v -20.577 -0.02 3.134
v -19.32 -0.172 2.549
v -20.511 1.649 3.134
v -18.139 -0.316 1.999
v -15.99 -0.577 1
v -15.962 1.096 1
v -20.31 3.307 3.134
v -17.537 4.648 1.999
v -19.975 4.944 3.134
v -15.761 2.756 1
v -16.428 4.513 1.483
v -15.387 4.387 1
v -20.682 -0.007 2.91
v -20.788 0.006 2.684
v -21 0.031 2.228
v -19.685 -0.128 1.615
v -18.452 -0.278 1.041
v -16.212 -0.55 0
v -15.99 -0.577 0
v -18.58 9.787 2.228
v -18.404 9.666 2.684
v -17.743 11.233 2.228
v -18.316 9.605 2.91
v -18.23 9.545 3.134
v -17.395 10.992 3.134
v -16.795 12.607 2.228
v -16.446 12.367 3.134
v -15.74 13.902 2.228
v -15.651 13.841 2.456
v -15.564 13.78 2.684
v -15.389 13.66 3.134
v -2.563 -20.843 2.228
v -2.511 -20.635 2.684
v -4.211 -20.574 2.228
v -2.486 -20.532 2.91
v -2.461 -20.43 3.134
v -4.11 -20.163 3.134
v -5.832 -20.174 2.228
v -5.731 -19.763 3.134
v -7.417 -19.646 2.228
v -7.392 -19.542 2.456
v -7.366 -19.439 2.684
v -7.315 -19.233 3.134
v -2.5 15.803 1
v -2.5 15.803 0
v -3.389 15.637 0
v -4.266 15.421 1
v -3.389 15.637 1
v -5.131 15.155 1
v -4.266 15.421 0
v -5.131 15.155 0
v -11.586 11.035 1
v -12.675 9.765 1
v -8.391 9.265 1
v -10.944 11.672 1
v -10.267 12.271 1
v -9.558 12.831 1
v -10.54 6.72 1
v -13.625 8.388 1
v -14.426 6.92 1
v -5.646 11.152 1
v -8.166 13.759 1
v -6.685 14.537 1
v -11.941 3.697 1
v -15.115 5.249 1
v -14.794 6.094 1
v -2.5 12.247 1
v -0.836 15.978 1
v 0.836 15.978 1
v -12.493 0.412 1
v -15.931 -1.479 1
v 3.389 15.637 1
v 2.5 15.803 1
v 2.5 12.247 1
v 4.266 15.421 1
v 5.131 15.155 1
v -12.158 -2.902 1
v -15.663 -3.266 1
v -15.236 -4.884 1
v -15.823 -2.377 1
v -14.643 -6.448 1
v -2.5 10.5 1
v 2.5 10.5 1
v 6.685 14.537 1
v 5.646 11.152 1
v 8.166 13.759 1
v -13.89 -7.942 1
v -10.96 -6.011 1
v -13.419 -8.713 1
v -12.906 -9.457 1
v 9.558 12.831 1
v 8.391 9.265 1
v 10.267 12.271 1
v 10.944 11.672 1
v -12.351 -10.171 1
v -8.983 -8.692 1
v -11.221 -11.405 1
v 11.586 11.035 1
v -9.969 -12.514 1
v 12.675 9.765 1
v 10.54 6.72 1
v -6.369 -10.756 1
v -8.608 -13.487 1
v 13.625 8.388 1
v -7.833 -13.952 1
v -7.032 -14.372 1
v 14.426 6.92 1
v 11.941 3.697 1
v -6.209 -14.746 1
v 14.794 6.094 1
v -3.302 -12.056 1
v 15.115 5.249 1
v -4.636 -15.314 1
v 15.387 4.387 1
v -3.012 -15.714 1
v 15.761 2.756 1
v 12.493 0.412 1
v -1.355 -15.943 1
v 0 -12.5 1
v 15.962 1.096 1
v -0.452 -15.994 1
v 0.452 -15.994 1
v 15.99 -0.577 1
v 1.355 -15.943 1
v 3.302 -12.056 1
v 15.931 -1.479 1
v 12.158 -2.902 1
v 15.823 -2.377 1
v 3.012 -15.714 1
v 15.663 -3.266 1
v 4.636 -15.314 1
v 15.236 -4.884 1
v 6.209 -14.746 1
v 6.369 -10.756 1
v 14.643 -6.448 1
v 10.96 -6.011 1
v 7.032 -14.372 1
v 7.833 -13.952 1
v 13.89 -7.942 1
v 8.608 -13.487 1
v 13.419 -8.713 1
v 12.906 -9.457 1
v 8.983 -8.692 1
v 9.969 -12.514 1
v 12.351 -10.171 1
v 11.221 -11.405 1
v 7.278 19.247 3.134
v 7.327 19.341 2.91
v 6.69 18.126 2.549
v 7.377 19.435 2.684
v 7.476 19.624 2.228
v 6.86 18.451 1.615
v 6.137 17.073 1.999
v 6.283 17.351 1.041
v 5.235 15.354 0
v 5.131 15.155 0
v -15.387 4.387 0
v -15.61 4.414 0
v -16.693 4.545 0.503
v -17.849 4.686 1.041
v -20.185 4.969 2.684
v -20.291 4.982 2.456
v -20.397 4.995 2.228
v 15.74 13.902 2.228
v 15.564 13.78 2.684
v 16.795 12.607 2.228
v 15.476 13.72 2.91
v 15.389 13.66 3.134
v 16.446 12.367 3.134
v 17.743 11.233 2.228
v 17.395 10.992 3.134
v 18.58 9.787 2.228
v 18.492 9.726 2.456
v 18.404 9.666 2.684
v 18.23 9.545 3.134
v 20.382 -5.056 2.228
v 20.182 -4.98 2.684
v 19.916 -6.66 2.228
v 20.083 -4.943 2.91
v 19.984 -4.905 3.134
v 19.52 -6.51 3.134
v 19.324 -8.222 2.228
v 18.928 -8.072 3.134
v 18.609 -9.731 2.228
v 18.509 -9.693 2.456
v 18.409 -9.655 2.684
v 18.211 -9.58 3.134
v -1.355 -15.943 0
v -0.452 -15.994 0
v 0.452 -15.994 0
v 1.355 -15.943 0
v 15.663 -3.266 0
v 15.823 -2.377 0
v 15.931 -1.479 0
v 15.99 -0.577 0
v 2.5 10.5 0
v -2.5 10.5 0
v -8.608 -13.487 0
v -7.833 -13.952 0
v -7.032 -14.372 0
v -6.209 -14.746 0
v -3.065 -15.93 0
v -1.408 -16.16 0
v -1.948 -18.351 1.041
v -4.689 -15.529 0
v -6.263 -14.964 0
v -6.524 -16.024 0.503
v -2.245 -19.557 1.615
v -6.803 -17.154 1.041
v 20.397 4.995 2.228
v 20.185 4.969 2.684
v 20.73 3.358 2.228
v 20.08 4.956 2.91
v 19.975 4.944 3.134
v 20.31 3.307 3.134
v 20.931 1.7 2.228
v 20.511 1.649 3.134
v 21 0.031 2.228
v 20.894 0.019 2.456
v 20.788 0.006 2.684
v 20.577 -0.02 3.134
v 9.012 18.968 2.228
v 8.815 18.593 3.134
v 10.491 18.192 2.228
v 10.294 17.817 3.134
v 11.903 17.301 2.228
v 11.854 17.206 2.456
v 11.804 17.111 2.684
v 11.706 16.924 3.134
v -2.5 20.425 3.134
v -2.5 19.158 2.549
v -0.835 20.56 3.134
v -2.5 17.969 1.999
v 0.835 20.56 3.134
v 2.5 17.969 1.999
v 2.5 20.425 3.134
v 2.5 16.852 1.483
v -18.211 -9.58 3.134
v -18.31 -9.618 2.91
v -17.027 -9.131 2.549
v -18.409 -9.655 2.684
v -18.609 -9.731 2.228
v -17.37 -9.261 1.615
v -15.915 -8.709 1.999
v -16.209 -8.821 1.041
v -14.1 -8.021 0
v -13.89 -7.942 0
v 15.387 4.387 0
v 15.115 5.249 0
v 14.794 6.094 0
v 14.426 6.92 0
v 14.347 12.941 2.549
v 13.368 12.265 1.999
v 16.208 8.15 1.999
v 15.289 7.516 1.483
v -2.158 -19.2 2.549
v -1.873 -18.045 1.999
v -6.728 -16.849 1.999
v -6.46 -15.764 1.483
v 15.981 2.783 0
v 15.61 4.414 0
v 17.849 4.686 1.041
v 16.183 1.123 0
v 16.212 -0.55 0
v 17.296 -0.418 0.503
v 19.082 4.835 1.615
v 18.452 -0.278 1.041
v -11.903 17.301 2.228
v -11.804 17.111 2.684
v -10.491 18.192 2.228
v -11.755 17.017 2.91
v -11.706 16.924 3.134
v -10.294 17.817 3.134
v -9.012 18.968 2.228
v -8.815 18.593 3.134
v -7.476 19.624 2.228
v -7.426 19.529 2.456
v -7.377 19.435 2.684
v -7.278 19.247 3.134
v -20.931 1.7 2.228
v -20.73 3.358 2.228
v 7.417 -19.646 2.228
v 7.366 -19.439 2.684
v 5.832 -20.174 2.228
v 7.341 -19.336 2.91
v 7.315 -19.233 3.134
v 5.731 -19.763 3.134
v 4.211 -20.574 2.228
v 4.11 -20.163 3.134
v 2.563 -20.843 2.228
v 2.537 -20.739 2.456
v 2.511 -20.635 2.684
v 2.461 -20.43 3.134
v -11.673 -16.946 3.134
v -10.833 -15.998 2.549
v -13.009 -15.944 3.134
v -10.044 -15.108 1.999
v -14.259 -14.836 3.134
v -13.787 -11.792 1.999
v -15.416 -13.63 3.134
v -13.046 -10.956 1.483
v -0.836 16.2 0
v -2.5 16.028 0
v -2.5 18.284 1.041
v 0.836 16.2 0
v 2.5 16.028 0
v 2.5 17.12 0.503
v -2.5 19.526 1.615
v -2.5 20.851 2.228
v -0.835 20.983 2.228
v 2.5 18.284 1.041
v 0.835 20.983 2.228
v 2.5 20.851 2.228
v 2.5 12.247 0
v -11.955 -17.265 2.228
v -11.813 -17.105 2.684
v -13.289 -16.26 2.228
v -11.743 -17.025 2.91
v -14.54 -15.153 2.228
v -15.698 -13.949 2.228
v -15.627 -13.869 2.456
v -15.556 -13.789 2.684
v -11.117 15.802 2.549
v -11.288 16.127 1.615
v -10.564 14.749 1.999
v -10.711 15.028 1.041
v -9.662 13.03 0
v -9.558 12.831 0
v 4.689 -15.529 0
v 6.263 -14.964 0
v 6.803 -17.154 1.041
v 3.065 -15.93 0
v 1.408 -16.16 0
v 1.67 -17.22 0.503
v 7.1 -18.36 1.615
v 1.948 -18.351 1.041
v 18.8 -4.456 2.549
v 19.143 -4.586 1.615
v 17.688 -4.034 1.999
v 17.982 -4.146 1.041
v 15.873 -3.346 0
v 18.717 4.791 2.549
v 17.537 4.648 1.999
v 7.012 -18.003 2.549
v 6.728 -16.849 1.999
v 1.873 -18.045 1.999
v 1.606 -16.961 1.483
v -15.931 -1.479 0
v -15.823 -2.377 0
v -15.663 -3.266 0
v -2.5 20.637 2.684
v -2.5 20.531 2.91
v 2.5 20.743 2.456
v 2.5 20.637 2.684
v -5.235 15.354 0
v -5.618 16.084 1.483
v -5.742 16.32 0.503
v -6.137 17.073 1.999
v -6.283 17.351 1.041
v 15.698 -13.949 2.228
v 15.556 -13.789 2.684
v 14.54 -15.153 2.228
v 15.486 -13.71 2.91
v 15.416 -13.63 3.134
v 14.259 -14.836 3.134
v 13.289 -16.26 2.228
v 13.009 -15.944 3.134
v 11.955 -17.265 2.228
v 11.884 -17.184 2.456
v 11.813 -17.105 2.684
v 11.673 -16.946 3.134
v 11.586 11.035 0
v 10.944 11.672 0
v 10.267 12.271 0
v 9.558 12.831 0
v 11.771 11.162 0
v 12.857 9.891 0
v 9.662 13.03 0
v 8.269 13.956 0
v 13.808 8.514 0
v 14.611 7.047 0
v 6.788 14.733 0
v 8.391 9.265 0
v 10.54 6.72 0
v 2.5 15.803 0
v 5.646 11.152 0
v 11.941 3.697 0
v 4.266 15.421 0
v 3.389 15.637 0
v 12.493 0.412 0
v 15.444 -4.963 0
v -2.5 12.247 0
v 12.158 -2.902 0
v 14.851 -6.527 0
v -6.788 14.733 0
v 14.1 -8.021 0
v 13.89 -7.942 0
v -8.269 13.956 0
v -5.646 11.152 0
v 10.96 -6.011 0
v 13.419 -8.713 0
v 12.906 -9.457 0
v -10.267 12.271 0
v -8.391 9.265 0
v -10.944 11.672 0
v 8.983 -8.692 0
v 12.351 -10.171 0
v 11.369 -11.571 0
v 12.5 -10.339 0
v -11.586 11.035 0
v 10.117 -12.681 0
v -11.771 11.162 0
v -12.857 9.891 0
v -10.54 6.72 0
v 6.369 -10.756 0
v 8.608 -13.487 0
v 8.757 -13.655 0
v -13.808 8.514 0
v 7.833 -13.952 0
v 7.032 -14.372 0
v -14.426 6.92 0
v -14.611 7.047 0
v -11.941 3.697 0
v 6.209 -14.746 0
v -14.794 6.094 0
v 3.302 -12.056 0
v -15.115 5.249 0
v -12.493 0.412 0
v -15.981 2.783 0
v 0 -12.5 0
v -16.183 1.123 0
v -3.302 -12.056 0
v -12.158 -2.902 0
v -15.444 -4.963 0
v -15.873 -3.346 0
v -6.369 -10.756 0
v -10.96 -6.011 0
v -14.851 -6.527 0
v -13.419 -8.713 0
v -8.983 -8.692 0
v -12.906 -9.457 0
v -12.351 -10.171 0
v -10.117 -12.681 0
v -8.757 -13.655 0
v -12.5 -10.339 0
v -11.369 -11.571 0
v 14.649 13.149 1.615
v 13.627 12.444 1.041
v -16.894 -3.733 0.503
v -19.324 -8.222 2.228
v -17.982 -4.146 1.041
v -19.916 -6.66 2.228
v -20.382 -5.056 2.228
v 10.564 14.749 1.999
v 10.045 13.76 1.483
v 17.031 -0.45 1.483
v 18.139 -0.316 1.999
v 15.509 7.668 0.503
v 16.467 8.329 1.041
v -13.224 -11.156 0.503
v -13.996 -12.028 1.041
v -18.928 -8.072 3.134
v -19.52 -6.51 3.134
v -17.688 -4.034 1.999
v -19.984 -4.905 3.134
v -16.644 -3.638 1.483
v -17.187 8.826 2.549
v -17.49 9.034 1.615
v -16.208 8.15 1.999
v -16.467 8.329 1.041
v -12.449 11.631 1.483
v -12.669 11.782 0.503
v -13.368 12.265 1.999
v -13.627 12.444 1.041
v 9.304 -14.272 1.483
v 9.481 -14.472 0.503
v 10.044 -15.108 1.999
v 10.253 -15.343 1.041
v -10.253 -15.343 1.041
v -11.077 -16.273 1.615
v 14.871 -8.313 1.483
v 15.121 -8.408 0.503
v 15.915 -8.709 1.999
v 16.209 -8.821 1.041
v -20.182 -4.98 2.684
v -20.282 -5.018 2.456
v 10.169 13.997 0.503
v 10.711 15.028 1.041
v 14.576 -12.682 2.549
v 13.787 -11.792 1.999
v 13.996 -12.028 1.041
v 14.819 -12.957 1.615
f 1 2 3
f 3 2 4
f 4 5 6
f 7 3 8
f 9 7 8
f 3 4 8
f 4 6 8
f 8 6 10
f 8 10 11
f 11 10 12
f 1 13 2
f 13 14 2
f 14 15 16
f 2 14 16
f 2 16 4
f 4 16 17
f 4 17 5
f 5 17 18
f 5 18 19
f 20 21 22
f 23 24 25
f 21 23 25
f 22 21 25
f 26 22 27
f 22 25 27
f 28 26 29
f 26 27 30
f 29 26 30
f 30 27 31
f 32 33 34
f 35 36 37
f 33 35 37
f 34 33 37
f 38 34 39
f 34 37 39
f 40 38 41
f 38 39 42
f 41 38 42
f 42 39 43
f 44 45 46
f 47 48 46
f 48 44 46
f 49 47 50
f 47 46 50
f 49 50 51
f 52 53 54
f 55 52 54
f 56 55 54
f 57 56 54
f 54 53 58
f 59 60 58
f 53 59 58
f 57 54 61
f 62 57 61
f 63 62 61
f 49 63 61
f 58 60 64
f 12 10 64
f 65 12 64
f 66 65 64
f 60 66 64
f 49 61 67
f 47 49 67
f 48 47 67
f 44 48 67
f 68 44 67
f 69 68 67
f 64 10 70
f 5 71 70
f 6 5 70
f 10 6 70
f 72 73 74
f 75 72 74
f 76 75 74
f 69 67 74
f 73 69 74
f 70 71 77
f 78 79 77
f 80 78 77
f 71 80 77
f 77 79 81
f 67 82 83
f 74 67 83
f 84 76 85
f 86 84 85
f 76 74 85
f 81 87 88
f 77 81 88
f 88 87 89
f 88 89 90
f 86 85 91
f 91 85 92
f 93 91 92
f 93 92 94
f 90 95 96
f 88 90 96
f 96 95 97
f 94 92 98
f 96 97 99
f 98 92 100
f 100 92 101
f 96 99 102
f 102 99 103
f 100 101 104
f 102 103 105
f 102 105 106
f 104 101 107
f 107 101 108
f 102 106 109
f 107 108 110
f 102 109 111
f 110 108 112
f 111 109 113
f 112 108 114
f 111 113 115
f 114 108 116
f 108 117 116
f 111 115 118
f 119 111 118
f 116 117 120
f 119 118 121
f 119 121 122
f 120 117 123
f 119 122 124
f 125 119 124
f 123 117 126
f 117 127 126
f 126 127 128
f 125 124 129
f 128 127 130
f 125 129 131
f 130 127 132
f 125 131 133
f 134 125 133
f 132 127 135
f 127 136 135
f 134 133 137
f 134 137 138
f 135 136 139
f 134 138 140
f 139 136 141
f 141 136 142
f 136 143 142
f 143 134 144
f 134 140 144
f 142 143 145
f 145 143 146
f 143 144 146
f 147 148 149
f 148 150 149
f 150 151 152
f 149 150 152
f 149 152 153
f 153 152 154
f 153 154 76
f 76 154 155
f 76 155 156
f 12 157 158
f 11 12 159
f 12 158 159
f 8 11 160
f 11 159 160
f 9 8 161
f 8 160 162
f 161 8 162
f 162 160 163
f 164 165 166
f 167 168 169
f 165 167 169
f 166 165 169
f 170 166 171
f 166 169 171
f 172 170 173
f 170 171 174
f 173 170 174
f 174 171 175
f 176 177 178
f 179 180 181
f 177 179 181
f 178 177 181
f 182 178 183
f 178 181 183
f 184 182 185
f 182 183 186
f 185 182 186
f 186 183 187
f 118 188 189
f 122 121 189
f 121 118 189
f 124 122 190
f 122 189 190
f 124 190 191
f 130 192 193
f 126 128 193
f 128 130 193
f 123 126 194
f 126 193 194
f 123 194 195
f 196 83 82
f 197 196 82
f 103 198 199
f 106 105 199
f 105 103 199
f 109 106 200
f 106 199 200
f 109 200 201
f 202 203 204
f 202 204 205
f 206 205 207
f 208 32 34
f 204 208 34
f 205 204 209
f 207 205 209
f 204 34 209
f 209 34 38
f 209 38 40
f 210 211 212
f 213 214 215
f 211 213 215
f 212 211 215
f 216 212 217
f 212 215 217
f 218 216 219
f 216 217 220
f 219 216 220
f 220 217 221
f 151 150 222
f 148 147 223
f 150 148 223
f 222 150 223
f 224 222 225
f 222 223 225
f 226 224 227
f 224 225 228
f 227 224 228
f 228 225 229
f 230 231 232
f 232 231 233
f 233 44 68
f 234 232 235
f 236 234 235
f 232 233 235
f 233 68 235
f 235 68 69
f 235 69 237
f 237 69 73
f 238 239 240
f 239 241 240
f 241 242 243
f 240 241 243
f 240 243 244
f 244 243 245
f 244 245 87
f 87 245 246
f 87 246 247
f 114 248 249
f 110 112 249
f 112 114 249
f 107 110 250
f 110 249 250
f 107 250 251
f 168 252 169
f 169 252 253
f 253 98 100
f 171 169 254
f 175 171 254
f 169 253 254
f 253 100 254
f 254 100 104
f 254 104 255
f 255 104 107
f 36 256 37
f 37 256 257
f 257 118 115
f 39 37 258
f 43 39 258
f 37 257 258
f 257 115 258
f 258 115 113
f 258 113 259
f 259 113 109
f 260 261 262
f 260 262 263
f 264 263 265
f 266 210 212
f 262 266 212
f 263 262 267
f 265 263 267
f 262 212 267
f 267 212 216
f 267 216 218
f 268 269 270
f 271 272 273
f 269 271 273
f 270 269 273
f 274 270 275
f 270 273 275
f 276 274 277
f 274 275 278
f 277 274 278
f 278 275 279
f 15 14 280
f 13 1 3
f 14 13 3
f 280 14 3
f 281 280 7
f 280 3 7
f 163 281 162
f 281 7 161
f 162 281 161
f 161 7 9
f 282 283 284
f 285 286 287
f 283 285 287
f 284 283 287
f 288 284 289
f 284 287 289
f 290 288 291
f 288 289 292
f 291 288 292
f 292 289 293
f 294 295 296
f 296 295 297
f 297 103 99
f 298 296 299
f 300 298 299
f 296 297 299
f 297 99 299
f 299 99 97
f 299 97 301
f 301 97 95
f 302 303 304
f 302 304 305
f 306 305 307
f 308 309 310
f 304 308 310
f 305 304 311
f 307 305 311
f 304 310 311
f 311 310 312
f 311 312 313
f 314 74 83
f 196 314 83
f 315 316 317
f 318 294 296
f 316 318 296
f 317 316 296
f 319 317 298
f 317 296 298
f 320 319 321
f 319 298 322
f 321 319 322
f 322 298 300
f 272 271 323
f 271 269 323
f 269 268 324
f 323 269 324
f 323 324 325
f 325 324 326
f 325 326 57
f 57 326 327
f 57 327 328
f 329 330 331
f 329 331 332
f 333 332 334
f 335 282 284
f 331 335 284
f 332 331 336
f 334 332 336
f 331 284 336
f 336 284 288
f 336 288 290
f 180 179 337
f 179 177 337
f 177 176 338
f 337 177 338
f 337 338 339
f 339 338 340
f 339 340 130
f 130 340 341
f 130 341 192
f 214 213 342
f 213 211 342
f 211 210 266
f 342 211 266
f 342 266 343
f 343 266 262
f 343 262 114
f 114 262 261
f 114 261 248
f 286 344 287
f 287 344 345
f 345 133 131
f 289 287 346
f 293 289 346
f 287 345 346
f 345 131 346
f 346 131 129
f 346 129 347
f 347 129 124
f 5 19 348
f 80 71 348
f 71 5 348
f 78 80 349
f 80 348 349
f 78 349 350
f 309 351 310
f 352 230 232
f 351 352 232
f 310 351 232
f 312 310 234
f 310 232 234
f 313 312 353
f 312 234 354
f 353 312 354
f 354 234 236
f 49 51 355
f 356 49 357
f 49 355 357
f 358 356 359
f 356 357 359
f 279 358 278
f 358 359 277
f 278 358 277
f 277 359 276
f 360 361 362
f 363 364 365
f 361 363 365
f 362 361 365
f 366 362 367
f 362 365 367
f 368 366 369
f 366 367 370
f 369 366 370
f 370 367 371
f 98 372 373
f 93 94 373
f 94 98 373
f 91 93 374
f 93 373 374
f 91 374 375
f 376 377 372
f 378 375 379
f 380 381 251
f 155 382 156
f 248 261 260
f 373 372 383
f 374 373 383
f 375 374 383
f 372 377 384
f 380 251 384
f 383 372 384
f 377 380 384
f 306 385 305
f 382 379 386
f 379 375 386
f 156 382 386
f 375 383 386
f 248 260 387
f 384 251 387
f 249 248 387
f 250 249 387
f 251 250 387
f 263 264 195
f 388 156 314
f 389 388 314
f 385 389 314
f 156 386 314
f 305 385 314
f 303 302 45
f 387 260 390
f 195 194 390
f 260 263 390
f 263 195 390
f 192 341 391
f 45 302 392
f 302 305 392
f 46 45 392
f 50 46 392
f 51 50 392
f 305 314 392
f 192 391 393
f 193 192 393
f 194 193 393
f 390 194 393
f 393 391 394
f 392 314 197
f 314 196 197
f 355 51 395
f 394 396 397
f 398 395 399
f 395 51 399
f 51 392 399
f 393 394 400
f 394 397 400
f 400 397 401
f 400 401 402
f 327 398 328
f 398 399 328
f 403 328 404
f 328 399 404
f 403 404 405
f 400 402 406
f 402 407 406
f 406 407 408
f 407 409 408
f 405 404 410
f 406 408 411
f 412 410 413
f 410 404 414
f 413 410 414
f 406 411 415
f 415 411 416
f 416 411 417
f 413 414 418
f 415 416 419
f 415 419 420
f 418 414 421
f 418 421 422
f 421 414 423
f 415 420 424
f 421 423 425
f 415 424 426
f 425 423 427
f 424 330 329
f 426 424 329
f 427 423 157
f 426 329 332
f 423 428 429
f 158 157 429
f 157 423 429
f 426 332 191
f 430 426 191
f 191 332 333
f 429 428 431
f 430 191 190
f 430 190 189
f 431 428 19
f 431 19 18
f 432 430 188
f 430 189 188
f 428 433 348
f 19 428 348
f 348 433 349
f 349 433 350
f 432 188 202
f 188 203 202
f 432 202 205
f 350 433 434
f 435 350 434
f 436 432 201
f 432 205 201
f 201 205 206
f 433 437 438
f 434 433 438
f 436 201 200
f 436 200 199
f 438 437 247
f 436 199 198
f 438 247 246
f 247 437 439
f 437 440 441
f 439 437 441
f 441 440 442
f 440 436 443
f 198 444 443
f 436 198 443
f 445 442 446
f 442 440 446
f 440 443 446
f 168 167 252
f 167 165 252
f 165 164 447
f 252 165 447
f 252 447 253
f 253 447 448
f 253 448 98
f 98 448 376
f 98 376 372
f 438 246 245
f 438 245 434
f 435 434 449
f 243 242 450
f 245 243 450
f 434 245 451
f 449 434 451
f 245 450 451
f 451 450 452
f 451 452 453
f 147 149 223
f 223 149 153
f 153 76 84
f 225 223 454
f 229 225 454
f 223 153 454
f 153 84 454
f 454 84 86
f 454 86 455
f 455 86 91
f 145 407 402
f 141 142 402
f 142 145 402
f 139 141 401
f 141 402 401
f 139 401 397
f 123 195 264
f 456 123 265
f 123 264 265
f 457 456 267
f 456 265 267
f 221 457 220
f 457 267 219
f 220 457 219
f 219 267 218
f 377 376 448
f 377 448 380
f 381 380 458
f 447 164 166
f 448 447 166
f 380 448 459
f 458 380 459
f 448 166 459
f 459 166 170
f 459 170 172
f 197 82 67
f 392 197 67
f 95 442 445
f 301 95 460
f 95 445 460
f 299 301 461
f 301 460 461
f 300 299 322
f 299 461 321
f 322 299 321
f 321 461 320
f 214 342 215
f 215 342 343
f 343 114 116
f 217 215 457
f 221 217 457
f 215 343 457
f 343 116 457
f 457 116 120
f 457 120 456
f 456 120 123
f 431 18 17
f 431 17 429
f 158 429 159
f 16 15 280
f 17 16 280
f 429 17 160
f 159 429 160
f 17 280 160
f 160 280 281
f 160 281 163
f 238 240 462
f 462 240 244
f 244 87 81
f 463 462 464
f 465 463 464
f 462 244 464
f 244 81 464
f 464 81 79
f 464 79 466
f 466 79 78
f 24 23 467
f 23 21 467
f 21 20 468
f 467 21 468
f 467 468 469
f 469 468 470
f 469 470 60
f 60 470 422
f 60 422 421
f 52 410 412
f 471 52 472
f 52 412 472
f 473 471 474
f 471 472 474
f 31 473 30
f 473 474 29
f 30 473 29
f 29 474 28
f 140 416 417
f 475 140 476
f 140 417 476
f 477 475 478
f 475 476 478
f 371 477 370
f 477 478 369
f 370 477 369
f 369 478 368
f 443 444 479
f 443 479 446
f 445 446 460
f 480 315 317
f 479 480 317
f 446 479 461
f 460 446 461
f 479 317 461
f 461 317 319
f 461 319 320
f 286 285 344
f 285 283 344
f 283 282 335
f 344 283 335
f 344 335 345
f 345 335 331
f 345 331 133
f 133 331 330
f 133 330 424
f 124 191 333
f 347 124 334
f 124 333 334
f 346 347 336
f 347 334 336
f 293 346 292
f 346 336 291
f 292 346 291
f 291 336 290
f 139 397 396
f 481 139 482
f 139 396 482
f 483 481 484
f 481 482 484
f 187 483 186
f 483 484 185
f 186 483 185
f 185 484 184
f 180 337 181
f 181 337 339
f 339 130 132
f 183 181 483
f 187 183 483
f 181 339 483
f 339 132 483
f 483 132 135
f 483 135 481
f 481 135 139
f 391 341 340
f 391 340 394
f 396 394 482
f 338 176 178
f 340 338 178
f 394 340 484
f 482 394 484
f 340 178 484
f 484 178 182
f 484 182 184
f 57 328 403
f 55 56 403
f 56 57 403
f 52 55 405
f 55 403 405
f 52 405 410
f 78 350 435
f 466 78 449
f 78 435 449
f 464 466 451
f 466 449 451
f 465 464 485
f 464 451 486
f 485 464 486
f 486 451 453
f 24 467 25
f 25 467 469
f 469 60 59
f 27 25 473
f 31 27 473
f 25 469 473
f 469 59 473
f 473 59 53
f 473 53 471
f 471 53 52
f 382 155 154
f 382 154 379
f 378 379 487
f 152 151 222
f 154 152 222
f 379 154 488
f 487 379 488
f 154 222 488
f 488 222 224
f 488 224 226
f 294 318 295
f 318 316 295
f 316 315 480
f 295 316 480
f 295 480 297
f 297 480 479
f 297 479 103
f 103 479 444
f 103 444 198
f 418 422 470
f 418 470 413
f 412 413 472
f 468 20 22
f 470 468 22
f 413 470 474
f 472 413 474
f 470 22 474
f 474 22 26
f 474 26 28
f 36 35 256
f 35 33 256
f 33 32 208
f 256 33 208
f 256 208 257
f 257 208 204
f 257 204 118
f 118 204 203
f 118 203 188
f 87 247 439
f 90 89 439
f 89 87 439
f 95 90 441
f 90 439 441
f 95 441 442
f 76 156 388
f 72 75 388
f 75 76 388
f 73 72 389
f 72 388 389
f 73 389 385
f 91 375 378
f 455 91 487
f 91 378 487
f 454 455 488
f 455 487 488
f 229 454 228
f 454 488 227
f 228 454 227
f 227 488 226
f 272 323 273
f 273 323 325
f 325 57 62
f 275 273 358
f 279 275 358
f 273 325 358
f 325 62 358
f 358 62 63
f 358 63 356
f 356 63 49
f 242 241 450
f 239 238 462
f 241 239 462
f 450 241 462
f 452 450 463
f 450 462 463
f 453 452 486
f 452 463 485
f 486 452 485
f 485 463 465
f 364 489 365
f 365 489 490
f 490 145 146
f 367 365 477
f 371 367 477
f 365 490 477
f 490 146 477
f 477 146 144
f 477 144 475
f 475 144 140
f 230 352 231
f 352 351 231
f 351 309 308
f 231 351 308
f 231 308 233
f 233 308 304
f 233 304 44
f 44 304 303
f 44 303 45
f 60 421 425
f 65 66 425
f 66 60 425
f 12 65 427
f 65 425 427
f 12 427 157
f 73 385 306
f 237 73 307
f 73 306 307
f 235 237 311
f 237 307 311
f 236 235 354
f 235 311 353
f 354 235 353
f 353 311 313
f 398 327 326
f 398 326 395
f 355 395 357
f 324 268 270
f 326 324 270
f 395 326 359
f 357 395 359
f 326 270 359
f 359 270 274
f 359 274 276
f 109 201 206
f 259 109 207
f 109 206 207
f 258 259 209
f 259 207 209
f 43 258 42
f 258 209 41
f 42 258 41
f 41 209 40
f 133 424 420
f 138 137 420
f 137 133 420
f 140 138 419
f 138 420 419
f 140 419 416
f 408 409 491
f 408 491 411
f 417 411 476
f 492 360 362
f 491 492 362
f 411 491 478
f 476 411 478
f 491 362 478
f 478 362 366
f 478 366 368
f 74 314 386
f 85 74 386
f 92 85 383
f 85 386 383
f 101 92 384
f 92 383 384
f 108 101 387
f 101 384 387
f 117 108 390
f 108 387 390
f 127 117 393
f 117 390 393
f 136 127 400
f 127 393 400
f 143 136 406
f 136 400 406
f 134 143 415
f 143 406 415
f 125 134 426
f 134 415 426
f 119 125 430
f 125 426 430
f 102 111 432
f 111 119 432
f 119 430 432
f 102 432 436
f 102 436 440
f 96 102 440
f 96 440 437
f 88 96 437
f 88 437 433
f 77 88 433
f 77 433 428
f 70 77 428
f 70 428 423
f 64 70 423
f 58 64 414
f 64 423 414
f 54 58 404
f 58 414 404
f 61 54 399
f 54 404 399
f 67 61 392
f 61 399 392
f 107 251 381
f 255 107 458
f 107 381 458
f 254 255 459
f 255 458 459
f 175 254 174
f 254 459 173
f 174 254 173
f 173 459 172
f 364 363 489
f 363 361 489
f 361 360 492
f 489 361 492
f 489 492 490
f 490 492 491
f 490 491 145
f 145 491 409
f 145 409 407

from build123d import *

# Parameters (mm, degrees)
CUT_EXTRUDE2_DEPTH  = 30.863437355
CIRPATTERN1_COUNT   = 13
BOSS_EXTRUDE1_START = -1
BOSS_EXTRUDE1_DEPTH = 1


with BuildPart() as part:
    # Sketch1 → Base-Revolve (revolve)
    with BuildSketch(Plane(origin=(0, 0, 0), x_dir=(0, 0, -1), z_dir=(1, 0, 0)), mode=Mode.PRIVATE) as base_revolve_sk:
        Polygon((0, 12.5), (0, 16.221694663), (-2.228160372, 21), (-3.134468159, 20.577381738), (-1, 16), (-1, 12.5), align=None)
    revolve(base_revolve_sk.sketch.rotate(Axis((0, 0, 14), (0, 0, -1)), 90), axis=Axis((0, 0, 14), (0, 0, -1)))

    # Sketch3 → Cut-Extrude2 (cut, through all)
    with BuildSketch(Plane(origin=(0, 0, 0), x_dir=(-1, 0, 0), z_dir=(0, 0, -1))):
        with BuildLine():
            Line((-2.5, 15.803480629), (-2.5, 20.850659462))
            ThreePointArc((-2.5, 20.850659462), (-5.02562895, 20.389778166), (-7.47614454, 19.62414999))
            Line((-7.47614454, 19.62414999), (-5.130603583, 15.15509508))
            ThreePointArc((-5.130603583, 15.15509508), (-3.829050629, 15.535069079), (-2.5, 15.803480629))
        make_face()
    cut_extrude2 = extrude(amount=-CUT_EXTRUDE2_DEPTH, mode=Mode.SUBTRACT)

    # CirPattern1: Cut-Extrude2 ×13 about axis
    cirpattern1_axis = Axis((0, 0, 0), (0, 0, 1))
    for i in range(1, CIRPATTERN1_COUNT):
        add(cut_extrude2.rotate(cirpattern1_axis, i * 360 / CIRPATTERN1_COUNT), mode=Mode.SUBTRACT)

    # Sketch4 → Boss-Extrude1 (add)
    with BuildSketch(Plane(origin=(0, 0, 0), x_dir=(-1, 0, 0), z_dir=(0, 0, -1)).offset(BOSS_EXTRUDE1_START)):
        with BuildLine():
            Line((-2.5, 12.247448714), (-2.5, 10.5))
            Line((-2.5, 10.5), (2.5, 10.5))
            Line((2.5, 10.5), (2.5, 12.247448714))
            ThreePointArc((2.5, 12.247448714), (0, 12.5), (-2.5, 12.247448714))
        make_face()
    extrude(amount=BOSS_EXTRUDE1_DEPTH)


solid = part.part
